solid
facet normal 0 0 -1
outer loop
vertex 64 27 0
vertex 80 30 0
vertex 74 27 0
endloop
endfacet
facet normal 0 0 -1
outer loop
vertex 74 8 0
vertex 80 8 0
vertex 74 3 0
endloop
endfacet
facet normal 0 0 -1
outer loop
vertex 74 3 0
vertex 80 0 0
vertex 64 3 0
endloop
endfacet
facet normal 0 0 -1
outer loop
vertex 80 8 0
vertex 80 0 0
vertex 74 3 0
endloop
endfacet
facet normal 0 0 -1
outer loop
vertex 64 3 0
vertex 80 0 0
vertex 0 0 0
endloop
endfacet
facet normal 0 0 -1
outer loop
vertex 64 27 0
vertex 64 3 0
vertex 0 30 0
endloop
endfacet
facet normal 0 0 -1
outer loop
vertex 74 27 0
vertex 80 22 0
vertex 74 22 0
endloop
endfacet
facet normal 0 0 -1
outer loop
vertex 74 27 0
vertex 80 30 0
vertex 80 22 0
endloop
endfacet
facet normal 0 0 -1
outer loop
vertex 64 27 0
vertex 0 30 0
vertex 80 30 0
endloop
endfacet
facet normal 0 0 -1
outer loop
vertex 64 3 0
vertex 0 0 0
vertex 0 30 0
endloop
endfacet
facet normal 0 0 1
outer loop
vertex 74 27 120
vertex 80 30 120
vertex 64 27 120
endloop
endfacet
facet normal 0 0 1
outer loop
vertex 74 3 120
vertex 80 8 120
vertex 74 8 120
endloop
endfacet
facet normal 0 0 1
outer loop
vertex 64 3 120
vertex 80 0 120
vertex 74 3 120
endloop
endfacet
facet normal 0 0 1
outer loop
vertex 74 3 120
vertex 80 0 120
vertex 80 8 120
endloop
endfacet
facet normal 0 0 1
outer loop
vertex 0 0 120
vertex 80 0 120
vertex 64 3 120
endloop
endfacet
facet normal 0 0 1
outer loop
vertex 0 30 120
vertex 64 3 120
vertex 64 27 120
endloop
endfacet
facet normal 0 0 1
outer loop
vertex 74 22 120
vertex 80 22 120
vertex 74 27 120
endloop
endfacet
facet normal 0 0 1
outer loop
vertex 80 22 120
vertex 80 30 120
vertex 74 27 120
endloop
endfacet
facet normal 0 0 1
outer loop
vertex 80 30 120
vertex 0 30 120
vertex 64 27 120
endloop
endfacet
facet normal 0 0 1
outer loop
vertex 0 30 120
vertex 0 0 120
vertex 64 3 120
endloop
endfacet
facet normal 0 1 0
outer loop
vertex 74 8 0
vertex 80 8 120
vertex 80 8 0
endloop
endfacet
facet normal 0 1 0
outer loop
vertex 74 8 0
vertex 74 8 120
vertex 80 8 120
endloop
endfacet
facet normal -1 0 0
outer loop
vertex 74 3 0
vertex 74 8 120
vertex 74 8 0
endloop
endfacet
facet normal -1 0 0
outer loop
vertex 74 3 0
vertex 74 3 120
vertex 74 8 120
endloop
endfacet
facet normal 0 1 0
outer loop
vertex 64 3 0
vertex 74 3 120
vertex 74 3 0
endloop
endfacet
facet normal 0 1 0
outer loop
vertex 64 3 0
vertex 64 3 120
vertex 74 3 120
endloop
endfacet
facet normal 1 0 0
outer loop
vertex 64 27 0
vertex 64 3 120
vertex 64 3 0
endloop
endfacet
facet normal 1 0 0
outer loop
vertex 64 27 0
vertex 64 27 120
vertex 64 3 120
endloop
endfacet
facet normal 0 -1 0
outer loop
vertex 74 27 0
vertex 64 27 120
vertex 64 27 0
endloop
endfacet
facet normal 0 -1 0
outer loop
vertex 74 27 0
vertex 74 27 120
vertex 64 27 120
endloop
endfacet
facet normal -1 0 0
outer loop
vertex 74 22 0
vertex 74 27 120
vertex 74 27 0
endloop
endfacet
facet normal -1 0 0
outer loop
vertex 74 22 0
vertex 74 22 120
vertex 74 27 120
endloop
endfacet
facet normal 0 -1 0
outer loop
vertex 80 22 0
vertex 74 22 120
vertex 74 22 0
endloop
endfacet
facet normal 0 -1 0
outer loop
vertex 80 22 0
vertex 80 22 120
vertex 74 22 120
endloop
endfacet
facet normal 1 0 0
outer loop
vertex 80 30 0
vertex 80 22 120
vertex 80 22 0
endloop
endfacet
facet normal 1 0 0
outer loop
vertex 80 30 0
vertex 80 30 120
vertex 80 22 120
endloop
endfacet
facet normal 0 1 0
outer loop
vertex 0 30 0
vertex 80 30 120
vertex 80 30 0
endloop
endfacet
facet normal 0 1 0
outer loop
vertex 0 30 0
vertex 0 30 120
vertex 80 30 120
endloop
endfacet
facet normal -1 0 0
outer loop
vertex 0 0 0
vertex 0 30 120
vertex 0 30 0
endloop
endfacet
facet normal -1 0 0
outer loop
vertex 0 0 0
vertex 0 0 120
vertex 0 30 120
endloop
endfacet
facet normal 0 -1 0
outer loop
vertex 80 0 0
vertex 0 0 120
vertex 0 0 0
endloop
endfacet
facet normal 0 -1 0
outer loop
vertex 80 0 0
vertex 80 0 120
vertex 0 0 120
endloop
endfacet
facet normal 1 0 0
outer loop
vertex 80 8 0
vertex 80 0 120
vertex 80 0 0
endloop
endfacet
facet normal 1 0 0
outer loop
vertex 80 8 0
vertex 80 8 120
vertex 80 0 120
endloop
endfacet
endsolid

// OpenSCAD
$fn = 32;

// ----------------------------------------------------------------------
// T-slot rail: 80 x 30 mm section, 120 mm long
// ----------------------------------------------------------------------

// --- parameters (mm) ---
profile_height = 120;     // extrusion height
profile_points = 12;      // points of the closed outline

profile = [[0, 0], [80, 0], [80, 8], [74, 8], [74, 3], [64, 3], [64, 27], [74, 27], [74, 22], [80, 22], [80, 30], [0, 30]];  // single closed polygon, 12 points, counter clockwise

// --- the one profile operation ---
linear_extrude(height = profile_height) polygon(points = profile);
